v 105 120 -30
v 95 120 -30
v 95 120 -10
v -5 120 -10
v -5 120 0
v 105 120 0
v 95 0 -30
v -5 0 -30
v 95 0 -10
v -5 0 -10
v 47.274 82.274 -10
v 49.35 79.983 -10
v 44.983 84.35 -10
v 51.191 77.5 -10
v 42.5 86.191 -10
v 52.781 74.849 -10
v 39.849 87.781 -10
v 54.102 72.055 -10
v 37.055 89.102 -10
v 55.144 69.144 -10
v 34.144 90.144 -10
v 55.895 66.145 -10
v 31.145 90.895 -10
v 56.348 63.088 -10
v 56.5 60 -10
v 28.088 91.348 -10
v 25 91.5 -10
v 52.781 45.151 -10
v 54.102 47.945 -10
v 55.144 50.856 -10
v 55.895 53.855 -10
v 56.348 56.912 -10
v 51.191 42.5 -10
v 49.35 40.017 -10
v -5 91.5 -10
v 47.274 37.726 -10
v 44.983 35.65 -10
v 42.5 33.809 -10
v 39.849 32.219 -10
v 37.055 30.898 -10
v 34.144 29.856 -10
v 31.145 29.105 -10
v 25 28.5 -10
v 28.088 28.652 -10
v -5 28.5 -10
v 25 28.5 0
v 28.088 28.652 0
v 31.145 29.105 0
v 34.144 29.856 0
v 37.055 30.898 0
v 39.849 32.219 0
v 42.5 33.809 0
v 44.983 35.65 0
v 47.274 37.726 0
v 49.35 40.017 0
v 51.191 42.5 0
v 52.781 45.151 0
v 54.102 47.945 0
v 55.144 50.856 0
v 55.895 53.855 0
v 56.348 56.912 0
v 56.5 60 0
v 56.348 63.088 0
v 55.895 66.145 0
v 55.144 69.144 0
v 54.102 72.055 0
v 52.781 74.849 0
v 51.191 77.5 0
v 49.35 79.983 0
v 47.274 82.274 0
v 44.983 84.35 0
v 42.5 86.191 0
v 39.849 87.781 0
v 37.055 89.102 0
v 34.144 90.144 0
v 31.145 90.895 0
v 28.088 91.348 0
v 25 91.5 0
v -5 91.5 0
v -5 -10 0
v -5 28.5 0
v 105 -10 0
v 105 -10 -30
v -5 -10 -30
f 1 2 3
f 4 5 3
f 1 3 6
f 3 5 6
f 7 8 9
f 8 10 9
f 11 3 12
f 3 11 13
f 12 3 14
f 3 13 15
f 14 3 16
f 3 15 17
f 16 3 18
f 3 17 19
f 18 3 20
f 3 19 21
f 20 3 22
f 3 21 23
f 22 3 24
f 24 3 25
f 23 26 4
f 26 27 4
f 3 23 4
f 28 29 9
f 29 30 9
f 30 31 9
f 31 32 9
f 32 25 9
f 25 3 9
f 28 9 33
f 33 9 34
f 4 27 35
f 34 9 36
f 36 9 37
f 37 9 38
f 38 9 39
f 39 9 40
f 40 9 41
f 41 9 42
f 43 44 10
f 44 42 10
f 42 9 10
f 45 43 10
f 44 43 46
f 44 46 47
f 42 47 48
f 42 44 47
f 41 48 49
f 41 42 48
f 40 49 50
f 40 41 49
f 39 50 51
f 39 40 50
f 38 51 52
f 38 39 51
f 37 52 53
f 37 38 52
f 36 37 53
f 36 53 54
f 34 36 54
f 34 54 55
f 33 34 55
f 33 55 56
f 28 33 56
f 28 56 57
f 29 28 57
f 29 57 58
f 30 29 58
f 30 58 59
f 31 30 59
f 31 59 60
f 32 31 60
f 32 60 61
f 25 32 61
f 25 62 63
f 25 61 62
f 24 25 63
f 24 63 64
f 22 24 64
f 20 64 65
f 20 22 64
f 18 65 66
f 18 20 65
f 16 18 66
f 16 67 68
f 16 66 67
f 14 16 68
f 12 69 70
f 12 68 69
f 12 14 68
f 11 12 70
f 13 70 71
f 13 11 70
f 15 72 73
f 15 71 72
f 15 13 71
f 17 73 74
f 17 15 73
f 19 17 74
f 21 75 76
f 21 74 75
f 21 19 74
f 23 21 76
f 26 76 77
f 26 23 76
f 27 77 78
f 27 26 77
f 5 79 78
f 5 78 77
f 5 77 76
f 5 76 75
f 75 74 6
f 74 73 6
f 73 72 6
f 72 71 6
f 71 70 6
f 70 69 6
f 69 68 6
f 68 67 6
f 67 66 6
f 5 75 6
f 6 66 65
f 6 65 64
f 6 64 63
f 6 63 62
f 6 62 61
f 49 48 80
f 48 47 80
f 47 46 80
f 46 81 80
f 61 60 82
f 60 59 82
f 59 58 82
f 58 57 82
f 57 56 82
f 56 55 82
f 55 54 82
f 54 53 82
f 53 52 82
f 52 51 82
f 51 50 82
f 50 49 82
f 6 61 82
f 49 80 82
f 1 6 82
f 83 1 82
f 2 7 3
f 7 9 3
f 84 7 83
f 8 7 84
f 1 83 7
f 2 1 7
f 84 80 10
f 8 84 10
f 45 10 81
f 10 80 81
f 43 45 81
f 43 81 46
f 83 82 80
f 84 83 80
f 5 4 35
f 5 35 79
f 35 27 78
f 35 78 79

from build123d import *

# Parameters (mm, degrees)
BOSS_EXTRUDE1_DEPTH = 60
SKETCH4_W           = 10
SKETCH4_H           = 90
BOSS_EXTRUDE2_DEPTH = 45
SKETCH6_W           = 25
SKETCH6_H           = 10
BOSS_EXTRUDE3_DEPTH = 45
SKETCH8_W           = 10
SKETCH8_H           = 15
BOSS_EXTRUDE4_DEPTH = 90
BOSS_EXTRUDE5_DEPTH = 30
BOSS_EXTRUDE6_DEPTH = 30
CUT_EXTRUDE1_DEPTH  = 30
CUT_EXTRUDE2_DEPTH  = 25
SKETCH14_W          = 10
SKETCH14_H          = 28.5
CUT_EXTRUDE3_DEPTH  = 25
BOSS_EXTRUDE7_DEPTH = 5


with BuildPart() as part:
    # Sketch1 → Boss-Extrude1 (new body)
    with BuildSketch(Plane(origin=(0, 0, 0), x_dir=(0, 0, -1), z_dir=(1, 0, 0))):
        Polygon((0, -10), (0, 90), (10, 90), (10, 0), (25, 0), (25, -10), align=None)
    extrude(amount=BOSS_EXTRUDE1_DEPTH)

    # Sketch4 → Boss-Extrude2 (add)
    with BuildSketch(Plane(origin=(60, 0, 0), x_dir=(0, 0, -1), z_dir=(1, 0, 0))):
        with Locations((5, 45)):
            Rectangle(SKETCH4_W, SKETCH4_H)
    extrude(amount=BOSS_EXTRUDE2_DEPTH)

    # Sketch6 → Boss-Extrude3 (add)
    with BuildSketch(Plane(origin=(60, 0, 0), x_dir=(0, 0, -1), z_dir=(1, 0, 0))):
        with Locations((12.5, -5)):
            Rectangle(SKETCH6_W, SKETCH6_H)
    extrude(amount=BOSS_EXTRUDE3_DEPTH)

    # Sketch8 → Boss-Extrude4 (add)
    with BuildSketch(Plane(origin=(0, 0, 0), x_dir=(1, 0, 0), z_dir=(0, 1, 0))):
        with Locations((100, 17.5)):
            Rectangle(SKETCH8_W, SKETCH8_H)
    extrude(amount=BOSS_EXTRUDE4_DEPTH)

    # Sketch10 → Boss-Extrude5 (add)
    with BuildSketch(Plane.ZY):
        Polygon((0, -10), (0, 90), (-10, 90), (-10, 0), (-25, 0), (-25, -10), align=None)
    extrude(amount=BOSS_EXTRUDE5_DEPTH)

    # Sketch11 → Boss-Extrude6 (add)
    with BuildSketch(Plane(origin=(0, 90, 0), x_dir=(1, 0, 0), z_dir=(0, 1, 0))):
        Polygon((-30, 10), (-30, 0), (105, 0), (105, 25), (95, 25), (95, 10), align=None)
    extrude(amount=BOSS_EXTRUDE6_DEPTH)

    # Sketch12 → Cut-Extrude1 (cut)
    with BuildSketch(Plane(origin=(0, 0, -10), x_dir=(-1, 0, 0), z_dir=(0, 0, -1))):
        with BuildLine():
            Line((-25, 91.5), (30, 91.5))
            Line((30, 91.5), (30, 28.5))
            Line((30, 28.5), (-25, 28.5))
            ThreePointArc((-25, 28.5), (-56.5, 60), (-25, 91.5))
        make_face()
    extrude(amount=-CUT_EXTRUDE1_DEPTH, mode=Mode.SUBTRACT)

    # Sketch13 → Cut-Extrude2 (cut)
    with BuildSketch(Plane.ZY.offset(30)):
        Polygon((0, 28.5), (-10, 28.5), (-10, 0), (-25, 0), (-25, -10), (0, -10), align=None)
    extrude(amount=-CUT_EXTRUDE2_DEPTH, mode=Mode.SUBTRACT)

    # Sketch14 → Cut-Extrude3 (cut)
    with BuildSketch(Plane.ZY.offset(30)):
        with Locations((-5, 105.75)):
            Rectangle(SKETCH14_W, SKETCH14_H)
    extrude(amount=-CUT_EXTRUDE3_DEPTH, mode=Mode.SUBTRACT)

    # Sketch15 → Boss-Extrude7 (add)
    with BuildSketch(Plane(origin=(0, 0, -25), x_dir=(-1, 0, 0), z_dir=(0, 0, -1))):
        Polygon((5, -10), (5, 0), (-95, 0), (-95, 120), (-105, 120), (-105, -10), align=None)
    extrude(amount=BOSS_EXTRUDE7_DEPTH)


solid = part.part
